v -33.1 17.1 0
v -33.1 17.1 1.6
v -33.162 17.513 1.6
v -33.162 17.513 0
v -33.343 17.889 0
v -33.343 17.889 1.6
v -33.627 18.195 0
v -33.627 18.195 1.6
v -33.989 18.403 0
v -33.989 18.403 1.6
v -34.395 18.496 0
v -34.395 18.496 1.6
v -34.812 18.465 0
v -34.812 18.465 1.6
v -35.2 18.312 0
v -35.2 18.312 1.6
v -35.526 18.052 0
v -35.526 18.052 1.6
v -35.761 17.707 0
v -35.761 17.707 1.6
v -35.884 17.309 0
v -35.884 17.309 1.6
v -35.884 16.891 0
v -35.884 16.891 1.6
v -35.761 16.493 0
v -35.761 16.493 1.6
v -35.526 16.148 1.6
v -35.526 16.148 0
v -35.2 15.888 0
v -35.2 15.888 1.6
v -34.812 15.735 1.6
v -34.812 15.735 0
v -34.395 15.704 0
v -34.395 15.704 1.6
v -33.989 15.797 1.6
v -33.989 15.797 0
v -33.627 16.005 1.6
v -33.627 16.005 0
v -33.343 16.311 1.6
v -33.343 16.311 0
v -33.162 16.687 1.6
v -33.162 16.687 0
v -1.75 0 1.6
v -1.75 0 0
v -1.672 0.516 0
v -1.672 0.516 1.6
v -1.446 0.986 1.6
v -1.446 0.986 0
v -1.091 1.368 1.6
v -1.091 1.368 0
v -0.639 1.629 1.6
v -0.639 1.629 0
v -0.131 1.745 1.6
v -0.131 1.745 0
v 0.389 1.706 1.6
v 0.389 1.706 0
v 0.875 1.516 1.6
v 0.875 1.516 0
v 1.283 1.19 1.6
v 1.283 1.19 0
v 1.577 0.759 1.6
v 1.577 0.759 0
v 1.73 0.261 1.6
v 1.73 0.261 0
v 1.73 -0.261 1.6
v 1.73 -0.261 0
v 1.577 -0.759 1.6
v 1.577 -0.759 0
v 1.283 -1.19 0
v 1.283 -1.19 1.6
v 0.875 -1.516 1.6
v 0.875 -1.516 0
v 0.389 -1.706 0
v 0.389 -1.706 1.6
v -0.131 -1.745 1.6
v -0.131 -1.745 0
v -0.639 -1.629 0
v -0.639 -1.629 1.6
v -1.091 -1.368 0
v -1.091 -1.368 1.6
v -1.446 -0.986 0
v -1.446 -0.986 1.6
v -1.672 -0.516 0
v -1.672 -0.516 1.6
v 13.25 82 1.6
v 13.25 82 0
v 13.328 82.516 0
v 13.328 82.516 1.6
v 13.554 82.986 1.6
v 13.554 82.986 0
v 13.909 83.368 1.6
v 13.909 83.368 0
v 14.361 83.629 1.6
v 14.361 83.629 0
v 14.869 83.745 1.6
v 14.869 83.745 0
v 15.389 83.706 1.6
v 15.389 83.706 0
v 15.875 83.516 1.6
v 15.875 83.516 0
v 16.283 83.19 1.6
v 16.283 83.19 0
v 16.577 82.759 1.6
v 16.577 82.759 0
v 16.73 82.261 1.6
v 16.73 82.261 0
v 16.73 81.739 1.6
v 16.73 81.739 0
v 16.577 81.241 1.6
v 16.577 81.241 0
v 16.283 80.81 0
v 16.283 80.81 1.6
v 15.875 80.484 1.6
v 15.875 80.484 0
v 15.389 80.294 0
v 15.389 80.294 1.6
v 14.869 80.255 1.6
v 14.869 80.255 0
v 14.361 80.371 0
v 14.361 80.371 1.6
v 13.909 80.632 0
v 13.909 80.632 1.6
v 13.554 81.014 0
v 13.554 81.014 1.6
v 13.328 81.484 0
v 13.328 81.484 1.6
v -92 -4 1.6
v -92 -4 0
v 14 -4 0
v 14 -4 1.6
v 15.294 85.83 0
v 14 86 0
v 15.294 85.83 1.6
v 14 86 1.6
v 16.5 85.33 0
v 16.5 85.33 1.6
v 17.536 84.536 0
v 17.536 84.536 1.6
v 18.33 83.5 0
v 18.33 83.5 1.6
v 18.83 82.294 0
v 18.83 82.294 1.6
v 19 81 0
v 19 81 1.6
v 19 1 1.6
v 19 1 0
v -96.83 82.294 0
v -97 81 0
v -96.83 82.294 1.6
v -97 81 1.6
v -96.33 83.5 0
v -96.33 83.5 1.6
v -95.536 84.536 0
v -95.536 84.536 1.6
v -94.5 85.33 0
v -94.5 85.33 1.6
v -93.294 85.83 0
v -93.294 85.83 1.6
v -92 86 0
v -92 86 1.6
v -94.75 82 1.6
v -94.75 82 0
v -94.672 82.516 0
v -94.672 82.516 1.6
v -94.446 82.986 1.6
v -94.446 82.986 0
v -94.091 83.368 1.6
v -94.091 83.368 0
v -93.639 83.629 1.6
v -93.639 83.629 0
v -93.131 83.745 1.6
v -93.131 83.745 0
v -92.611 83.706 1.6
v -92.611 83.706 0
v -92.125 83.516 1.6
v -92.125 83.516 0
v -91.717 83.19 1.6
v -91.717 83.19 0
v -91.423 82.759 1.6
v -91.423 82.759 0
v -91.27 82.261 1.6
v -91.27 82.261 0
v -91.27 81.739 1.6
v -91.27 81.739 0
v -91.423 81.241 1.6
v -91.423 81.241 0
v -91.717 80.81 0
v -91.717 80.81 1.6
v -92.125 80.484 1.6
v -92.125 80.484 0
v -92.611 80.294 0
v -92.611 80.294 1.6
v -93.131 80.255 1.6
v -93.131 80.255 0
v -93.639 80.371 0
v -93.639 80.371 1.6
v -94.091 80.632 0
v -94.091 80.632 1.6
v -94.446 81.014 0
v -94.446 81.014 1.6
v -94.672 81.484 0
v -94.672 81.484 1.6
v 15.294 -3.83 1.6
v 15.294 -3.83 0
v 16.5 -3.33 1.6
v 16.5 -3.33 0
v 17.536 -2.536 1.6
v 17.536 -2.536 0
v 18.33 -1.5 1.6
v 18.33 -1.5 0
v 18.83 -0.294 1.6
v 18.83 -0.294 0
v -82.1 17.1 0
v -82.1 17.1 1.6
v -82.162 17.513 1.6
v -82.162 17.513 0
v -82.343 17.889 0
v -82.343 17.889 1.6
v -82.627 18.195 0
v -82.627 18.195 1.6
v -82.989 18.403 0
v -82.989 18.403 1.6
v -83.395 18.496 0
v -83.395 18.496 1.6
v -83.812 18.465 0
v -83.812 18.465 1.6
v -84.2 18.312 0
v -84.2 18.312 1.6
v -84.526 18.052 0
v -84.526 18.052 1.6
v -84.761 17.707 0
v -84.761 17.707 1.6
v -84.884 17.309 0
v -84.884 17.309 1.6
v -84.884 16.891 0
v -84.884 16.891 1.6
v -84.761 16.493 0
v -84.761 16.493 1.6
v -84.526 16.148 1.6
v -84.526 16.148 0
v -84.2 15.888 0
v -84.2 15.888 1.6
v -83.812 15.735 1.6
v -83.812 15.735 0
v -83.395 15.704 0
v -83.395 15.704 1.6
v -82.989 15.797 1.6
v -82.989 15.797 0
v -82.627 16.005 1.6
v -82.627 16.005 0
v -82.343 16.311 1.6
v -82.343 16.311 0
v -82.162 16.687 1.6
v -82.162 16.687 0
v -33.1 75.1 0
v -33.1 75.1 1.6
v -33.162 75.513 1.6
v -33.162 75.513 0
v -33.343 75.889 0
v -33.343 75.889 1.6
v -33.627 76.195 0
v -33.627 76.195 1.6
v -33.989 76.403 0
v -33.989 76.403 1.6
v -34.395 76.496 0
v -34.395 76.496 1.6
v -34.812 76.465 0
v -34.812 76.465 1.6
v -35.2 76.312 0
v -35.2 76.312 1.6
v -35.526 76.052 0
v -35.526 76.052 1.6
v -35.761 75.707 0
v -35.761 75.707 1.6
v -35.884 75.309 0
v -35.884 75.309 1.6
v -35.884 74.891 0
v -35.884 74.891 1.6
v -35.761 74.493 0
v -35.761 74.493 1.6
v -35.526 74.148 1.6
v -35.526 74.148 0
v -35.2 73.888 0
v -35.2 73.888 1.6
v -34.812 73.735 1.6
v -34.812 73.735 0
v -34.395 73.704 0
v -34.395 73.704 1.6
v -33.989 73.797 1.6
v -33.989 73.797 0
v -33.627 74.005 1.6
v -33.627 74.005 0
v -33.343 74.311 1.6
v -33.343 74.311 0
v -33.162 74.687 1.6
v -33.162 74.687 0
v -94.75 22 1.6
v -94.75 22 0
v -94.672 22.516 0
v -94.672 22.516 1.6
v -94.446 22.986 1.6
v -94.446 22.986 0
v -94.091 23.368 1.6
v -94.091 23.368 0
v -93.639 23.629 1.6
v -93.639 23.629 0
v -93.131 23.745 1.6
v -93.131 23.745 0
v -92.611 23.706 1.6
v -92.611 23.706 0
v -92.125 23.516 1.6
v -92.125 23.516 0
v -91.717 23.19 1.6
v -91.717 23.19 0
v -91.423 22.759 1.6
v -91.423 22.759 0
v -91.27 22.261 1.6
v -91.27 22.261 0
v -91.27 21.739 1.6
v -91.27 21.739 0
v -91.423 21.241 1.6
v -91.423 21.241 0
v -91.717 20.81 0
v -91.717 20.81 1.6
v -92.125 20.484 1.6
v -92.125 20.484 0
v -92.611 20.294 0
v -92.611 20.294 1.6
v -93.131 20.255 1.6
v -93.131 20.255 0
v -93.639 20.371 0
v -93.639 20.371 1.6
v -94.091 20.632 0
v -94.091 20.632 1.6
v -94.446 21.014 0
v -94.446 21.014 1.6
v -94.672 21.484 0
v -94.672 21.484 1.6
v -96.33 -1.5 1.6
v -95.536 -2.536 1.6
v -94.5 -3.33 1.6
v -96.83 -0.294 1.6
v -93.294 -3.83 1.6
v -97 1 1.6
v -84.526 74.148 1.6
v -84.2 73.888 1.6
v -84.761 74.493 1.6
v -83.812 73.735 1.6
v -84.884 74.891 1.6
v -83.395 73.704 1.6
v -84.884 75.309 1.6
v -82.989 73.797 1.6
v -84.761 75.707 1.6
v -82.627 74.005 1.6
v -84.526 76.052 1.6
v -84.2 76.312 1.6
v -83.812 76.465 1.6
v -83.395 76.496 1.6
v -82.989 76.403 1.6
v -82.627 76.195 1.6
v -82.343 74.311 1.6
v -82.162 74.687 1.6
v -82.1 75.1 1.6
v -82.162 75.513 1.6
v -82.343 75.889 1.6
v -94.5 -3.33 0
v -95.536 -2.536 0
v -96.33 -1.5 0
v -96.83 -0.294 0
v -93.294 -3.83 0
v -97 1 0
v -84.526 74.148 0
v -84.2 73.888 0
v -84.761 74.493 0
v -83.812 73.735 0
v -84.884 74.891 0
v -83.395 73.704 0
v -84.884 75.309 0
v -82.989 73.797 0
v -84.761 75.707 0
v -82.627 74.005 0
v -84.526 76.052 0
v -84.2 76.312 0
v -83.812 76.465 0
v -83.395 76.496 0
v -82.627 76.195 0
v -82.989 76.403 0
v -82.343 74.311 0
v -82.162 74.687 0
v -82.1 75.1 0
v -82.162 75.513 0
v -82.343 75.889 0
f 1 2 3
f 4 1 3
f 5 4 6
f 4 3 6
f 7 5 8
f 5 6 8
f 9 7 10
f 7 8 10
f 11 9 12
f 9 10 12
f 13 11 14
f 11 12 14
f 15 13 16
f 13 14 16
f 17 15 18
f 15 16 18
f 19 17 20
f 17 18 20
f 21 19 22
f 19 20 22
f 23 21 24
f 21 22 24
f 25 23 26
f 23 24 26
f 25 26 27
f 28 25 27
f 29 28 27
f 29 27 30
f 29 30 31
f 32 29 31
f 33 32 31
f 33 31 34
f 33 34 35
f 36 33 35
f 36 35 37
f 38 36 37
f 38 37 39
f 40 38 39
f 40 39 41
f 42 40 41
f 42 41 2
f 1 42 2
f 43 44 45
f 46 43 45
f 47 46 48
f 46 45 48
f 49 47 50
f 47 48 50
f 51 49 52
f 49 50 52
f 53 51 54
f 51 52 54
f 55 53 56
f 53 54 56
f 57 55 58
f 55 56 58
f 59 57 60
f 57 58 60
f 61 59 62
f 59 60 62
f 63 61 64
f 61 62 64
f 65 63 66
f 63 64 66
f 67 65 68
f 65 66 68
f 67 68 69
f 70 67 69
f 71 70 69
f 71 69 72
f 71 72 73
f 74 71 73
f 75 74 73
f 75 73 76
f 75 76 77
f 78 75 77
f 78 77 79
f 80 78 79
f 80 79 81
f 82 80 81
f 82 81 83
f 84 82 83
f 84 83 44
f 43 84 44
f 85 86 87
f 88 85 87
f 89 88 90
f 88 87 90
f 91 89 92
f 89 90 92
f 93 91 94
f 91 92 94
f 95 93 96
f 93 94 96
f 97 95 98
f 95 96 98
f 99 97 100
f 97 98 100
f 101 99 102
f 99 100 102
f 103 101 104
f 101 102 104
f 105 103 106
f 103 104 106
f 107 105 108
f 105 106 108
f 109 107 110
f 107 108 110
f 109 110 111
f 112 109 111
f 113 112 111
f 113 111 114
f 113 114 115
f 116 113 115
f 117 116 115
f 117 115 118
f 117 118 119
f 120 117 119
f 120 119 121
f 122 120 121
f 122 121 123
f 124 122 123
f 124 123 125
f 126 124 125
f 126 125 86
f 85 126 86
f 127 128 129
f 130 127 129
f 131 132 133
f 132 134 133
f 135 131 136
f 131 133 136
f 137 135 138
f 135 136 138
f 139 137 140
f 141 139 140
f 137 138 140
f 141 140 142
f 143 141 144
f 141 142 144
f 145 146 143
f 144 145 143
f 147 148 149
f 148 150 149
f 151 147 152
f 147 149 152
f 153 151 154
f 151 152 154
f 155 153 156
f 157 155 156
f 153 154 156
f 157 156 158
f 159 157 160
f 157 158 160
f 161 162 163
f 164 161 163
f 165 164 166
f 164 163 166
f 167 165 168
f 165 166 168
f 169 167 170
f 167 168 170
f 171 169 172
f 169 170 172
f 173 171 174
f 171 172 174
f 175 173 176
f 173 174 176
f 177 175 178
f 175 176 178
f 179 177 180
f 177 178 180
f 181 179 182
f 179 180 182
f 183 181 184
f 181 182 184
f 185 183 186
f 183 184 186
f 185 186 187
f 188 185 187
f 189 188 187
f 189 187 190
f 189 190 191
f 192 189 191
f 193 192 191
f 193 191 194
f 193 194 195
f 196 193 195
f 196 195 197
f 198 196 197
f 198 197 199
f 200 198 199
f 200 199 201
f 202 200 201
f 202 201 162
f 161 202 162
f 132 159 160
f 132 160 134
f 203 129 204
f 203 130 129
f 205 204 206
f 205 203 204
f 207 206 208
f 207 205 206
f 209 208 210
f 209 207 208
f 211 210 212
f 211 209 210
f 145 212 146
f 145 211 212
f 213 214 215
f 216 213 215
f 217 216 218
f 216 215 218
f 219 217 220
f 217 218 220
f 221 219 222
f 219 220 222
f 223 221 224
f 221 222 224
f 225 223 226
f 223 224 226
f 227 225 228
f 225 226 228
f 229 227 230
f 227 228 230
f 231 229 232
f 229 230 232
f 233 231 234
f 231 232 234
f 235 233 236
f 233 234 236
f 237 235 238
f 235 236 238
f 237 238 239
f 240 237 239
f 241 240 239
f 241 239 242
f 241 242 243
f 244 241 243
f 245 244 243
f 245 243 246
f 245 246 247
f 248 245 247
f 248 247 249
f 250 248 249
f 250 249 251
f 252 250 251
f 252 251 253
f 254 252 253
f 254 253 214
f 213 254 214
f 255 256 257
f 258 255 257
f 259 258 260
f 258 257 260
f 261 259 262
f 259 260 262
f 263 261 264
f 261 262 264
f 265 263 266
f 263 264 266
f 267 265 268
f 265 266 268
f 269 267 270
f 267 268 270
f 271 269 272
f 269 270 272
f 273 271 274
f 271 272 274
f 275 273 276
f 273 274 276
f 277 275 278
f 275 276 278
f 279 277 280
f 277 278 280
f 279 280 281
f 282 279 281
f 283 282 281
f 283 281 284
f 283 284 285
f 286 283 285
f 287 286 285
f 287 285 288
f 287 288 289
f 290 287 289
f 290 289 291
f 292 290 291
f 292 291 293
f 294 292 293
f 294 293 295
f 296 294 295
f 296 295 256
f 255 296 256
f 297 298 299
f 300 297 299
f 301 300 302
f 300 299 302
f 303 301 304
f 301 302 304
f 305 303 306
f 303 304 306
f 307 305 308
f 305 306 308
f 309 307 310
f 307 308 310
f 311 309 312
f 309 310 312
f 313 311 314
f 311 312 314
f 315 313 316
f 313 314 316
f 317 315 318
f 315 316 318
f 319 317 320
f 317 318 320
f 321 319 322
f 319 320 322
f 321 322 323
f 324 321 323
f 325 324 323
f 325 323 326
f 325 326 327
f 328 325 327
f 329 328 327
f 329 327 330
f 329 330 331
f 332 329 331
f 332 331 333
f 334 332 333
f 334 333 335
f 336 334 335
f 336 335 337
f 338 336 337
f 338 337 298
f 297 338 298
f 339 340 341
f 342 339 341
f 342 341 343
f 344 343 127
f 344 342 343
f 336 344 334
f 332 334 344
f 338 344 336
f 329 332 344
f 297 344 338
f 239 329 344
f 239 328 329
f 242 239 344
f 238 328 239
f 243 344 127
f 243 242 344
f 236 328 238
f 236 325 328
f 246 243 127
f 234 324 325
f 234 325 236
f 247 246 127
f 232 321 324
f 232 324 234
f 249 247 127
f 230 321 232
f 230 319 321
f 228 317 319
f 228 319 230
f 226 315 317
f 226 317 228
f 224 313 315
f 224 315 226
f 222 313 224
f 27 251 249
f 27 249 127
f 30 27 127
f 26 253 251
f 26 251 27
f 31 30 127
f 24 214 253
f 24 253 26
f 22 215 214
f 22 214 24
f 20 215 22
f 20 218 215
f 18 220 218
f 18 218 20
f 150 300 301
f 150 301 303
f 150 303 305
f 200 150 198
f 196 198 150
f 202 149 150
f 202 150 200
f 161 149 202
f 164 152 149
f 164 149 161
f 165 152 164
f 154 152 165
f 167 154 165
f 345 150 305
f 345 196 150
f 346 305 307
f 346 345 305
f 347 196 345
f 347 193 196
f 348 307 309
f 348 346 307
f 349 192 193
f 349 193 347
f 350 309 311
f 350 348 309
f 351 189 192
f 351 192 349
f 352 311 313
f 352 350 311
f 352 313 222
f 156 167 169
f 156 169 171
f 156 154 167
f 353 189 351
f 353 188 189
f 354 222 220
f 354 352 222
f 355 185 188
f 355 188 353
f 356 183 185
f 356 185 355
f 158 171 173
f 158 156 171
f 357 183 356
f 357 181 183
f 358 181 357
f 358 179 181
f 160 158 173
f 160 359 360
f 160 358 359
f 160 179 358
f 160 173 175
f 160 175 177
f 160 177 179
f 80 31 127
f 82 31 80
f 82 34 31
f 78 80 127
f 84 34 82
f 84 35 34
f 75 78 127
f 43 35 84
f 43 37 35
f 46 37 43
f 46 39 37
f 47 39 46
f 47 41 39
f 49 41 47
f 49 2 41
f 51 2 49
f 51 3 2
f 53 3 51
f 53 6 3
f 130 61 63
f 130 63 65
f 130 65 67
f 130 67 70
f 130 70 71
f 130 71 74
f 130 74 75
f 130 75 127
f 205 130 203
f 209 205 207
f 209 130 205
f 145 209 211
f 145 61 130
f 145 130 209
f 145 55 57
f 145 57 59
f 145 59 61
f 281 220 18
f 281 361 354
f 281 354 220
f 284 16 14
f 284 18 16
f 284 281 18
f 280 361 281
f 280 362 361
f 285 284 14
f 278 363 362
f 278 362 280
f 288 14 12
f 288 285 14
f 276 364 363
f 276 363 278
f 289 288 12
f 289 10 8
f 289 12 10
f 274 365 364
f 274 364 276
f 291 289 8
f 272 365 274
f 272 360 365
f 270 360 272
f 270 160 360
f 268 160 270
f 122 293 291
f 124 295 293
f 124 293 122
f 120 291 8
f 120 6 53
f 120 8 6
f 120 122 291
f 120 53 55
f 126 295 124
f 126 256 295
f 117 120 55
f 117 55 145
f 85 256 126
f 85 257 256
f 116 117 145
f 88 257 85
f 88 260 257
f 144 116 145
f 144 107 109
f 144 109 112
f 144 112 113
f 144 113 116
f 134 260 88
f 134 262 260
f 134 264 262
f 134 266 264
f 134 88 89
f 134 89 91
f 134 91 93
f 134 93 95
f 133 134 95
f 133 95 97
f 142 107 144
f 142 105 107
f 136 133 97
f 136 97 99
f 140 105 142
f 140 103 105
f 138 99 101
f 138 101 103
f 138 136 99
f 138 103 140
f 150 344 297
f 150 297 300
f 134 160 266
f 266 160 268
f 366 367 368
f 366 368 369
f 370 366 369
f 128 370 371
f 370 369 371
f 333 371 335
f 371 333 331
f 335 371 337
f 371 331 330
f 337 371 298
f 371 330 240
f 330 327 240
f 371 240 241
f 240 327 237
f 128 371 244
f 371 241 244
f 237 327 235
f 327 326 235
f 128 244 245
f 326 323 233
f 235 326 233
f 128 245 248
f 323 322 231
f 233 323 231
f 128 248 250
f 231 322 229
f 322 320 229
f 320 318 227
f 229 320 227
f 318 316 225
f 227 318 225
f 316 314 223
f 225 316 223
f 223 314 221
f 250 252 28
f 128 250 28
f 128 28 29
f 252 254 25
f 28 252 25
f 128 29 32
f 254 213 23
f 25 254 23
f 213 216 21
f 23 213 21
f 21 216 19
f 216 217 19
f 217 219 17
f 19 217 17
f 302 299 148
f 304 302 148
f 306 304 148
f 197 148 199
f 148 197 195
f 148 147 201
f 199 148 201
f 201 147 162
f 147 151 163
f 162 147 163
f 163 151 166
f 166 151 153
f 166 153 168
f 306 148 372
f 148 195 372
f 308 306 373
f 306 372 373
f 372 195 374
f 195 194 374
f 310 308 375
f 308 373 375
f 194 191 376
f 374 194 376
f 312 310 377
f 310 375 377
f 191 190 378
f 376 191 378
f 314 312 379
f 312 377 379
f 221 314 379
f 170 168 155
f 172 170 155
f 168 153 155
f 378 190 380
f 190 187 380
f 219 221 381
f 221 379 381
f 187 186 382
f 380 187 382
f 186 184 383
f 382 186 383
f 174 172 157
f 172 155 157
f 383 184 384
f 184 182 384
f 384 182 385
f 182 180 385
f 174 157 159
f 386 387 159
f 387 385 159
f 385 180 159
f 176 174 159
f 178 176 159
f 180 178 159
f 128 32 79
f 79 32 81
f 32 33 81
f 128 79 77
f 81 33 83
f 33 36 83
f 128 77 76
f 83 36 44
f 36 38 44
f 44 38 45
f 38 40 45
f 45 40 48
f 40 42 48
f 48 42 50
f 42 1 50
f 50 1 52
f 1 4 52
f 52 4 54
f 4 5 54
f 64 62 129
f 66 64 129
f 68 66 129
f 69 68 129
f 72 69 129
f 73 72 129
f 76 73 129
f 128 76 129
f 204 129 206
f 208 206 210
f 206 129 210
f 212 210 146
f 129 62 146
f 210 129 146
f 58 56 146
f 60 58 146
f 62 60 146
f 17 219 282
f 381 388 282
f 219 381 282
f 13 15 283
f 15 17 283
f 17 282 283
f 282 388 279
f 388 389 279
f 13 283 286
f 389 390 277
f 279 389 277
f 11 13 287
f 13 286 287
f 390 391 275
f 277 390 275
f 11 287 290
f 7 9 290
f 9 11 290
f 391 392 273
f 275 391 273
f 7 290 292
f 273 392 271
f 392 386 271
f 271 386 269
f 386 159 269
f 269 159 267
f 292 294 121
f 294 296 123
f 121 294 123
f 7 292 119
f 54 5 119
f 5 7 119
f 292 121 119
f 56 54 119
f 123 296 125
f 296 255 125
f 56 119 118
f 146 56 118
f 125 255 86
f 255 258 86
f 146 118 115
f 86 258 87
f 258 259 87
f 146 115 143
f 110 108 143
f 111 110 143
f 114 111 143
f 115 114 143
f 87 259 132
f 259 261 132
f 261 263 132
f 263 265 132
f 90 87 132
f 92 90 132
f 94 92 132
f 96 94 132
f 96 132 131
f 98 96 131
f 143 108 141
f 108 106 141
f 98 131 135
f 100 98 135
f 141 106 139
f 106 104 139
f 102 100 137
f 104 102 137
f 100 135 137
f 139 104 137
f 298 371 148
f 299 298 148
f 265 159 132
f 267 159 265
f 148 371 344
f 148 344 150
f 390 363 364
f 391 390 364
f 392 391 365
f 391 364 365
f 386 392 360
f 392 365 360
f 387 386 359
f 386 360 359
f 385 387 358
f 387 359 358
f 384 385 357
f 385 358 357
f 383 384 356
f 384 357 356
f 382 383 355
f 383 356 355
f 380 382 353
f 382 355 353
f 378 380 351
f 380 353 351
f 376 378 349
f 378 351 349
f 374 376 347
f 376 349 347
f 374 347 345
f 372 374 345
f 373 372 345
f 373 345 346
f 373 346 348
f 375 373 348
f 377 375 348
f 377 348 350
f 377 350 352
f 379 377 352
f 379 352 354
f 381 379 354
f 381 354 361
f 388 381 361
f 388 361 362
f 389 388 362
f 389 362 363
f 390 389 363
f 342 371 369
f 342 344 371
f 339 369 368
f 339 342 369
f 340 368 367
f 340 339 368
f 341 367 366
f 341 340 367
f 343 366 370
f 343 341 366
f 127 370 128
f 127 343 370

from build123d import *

# Parameters (mm, degrees)
SKETCH1_W                  = 116
SKETCH1_H                  = 90
BOSS_EXTRUDE1_DEPTH        = 1.6
F_3_5_3_5_DIAMETER_HOLE1_D = 3.5
FILLET1_R                  = 5
F_2_8_2_8_DIAMETER_HOLE1_D = 2.8


with BuildPart() as part:
    # Sketch1 → Boss-Extrude1 (new body)
    with BuildSketch(Plane.XY):
        with Locations((-39, 41)):
            Rectangle(SKETCH1_W, SKETCH1_H)
    extrude(amount=BOSS_EXTRUDE1_DEPTH)

    # Ø3.5 (3.5) Diameter Hole1 (through all)
    with Locations(Plane.XY.offset(1.6)):
        with Locations((0, 0), (15, 82), (-93, 82), (-93, 22)):
            Hole(F_3_5_3_5_DIAMETER_HOLE1_D / 2)

    # Fillet1
    fillet1_edges = [part.edges().sort_by_distance(p)[0] for p in [
        (-97, 86, 0.8),
        (19, 86, 0.8),
        (19, -4, 0.8),
        (-97, -4, 0.8),
    ]]
    fillet(fillet1_edges, radius=FILLET1_R)

    # Ø2.8 (2.8) Diameter Hole1 (through all)
    with Locations(Plane(origin=(0, 0, 0), x_dir=(-1, 0, 0), z_dir=(0, 0, -1))):
        with Locations((34.5, 75.1), (83.5, 75.1), (83.5, 17.1), (34.5, 17.1)):
            Hole(F_2_8_2_8_DIAMETER_HOLE1_D / 2)


solid = part.part
